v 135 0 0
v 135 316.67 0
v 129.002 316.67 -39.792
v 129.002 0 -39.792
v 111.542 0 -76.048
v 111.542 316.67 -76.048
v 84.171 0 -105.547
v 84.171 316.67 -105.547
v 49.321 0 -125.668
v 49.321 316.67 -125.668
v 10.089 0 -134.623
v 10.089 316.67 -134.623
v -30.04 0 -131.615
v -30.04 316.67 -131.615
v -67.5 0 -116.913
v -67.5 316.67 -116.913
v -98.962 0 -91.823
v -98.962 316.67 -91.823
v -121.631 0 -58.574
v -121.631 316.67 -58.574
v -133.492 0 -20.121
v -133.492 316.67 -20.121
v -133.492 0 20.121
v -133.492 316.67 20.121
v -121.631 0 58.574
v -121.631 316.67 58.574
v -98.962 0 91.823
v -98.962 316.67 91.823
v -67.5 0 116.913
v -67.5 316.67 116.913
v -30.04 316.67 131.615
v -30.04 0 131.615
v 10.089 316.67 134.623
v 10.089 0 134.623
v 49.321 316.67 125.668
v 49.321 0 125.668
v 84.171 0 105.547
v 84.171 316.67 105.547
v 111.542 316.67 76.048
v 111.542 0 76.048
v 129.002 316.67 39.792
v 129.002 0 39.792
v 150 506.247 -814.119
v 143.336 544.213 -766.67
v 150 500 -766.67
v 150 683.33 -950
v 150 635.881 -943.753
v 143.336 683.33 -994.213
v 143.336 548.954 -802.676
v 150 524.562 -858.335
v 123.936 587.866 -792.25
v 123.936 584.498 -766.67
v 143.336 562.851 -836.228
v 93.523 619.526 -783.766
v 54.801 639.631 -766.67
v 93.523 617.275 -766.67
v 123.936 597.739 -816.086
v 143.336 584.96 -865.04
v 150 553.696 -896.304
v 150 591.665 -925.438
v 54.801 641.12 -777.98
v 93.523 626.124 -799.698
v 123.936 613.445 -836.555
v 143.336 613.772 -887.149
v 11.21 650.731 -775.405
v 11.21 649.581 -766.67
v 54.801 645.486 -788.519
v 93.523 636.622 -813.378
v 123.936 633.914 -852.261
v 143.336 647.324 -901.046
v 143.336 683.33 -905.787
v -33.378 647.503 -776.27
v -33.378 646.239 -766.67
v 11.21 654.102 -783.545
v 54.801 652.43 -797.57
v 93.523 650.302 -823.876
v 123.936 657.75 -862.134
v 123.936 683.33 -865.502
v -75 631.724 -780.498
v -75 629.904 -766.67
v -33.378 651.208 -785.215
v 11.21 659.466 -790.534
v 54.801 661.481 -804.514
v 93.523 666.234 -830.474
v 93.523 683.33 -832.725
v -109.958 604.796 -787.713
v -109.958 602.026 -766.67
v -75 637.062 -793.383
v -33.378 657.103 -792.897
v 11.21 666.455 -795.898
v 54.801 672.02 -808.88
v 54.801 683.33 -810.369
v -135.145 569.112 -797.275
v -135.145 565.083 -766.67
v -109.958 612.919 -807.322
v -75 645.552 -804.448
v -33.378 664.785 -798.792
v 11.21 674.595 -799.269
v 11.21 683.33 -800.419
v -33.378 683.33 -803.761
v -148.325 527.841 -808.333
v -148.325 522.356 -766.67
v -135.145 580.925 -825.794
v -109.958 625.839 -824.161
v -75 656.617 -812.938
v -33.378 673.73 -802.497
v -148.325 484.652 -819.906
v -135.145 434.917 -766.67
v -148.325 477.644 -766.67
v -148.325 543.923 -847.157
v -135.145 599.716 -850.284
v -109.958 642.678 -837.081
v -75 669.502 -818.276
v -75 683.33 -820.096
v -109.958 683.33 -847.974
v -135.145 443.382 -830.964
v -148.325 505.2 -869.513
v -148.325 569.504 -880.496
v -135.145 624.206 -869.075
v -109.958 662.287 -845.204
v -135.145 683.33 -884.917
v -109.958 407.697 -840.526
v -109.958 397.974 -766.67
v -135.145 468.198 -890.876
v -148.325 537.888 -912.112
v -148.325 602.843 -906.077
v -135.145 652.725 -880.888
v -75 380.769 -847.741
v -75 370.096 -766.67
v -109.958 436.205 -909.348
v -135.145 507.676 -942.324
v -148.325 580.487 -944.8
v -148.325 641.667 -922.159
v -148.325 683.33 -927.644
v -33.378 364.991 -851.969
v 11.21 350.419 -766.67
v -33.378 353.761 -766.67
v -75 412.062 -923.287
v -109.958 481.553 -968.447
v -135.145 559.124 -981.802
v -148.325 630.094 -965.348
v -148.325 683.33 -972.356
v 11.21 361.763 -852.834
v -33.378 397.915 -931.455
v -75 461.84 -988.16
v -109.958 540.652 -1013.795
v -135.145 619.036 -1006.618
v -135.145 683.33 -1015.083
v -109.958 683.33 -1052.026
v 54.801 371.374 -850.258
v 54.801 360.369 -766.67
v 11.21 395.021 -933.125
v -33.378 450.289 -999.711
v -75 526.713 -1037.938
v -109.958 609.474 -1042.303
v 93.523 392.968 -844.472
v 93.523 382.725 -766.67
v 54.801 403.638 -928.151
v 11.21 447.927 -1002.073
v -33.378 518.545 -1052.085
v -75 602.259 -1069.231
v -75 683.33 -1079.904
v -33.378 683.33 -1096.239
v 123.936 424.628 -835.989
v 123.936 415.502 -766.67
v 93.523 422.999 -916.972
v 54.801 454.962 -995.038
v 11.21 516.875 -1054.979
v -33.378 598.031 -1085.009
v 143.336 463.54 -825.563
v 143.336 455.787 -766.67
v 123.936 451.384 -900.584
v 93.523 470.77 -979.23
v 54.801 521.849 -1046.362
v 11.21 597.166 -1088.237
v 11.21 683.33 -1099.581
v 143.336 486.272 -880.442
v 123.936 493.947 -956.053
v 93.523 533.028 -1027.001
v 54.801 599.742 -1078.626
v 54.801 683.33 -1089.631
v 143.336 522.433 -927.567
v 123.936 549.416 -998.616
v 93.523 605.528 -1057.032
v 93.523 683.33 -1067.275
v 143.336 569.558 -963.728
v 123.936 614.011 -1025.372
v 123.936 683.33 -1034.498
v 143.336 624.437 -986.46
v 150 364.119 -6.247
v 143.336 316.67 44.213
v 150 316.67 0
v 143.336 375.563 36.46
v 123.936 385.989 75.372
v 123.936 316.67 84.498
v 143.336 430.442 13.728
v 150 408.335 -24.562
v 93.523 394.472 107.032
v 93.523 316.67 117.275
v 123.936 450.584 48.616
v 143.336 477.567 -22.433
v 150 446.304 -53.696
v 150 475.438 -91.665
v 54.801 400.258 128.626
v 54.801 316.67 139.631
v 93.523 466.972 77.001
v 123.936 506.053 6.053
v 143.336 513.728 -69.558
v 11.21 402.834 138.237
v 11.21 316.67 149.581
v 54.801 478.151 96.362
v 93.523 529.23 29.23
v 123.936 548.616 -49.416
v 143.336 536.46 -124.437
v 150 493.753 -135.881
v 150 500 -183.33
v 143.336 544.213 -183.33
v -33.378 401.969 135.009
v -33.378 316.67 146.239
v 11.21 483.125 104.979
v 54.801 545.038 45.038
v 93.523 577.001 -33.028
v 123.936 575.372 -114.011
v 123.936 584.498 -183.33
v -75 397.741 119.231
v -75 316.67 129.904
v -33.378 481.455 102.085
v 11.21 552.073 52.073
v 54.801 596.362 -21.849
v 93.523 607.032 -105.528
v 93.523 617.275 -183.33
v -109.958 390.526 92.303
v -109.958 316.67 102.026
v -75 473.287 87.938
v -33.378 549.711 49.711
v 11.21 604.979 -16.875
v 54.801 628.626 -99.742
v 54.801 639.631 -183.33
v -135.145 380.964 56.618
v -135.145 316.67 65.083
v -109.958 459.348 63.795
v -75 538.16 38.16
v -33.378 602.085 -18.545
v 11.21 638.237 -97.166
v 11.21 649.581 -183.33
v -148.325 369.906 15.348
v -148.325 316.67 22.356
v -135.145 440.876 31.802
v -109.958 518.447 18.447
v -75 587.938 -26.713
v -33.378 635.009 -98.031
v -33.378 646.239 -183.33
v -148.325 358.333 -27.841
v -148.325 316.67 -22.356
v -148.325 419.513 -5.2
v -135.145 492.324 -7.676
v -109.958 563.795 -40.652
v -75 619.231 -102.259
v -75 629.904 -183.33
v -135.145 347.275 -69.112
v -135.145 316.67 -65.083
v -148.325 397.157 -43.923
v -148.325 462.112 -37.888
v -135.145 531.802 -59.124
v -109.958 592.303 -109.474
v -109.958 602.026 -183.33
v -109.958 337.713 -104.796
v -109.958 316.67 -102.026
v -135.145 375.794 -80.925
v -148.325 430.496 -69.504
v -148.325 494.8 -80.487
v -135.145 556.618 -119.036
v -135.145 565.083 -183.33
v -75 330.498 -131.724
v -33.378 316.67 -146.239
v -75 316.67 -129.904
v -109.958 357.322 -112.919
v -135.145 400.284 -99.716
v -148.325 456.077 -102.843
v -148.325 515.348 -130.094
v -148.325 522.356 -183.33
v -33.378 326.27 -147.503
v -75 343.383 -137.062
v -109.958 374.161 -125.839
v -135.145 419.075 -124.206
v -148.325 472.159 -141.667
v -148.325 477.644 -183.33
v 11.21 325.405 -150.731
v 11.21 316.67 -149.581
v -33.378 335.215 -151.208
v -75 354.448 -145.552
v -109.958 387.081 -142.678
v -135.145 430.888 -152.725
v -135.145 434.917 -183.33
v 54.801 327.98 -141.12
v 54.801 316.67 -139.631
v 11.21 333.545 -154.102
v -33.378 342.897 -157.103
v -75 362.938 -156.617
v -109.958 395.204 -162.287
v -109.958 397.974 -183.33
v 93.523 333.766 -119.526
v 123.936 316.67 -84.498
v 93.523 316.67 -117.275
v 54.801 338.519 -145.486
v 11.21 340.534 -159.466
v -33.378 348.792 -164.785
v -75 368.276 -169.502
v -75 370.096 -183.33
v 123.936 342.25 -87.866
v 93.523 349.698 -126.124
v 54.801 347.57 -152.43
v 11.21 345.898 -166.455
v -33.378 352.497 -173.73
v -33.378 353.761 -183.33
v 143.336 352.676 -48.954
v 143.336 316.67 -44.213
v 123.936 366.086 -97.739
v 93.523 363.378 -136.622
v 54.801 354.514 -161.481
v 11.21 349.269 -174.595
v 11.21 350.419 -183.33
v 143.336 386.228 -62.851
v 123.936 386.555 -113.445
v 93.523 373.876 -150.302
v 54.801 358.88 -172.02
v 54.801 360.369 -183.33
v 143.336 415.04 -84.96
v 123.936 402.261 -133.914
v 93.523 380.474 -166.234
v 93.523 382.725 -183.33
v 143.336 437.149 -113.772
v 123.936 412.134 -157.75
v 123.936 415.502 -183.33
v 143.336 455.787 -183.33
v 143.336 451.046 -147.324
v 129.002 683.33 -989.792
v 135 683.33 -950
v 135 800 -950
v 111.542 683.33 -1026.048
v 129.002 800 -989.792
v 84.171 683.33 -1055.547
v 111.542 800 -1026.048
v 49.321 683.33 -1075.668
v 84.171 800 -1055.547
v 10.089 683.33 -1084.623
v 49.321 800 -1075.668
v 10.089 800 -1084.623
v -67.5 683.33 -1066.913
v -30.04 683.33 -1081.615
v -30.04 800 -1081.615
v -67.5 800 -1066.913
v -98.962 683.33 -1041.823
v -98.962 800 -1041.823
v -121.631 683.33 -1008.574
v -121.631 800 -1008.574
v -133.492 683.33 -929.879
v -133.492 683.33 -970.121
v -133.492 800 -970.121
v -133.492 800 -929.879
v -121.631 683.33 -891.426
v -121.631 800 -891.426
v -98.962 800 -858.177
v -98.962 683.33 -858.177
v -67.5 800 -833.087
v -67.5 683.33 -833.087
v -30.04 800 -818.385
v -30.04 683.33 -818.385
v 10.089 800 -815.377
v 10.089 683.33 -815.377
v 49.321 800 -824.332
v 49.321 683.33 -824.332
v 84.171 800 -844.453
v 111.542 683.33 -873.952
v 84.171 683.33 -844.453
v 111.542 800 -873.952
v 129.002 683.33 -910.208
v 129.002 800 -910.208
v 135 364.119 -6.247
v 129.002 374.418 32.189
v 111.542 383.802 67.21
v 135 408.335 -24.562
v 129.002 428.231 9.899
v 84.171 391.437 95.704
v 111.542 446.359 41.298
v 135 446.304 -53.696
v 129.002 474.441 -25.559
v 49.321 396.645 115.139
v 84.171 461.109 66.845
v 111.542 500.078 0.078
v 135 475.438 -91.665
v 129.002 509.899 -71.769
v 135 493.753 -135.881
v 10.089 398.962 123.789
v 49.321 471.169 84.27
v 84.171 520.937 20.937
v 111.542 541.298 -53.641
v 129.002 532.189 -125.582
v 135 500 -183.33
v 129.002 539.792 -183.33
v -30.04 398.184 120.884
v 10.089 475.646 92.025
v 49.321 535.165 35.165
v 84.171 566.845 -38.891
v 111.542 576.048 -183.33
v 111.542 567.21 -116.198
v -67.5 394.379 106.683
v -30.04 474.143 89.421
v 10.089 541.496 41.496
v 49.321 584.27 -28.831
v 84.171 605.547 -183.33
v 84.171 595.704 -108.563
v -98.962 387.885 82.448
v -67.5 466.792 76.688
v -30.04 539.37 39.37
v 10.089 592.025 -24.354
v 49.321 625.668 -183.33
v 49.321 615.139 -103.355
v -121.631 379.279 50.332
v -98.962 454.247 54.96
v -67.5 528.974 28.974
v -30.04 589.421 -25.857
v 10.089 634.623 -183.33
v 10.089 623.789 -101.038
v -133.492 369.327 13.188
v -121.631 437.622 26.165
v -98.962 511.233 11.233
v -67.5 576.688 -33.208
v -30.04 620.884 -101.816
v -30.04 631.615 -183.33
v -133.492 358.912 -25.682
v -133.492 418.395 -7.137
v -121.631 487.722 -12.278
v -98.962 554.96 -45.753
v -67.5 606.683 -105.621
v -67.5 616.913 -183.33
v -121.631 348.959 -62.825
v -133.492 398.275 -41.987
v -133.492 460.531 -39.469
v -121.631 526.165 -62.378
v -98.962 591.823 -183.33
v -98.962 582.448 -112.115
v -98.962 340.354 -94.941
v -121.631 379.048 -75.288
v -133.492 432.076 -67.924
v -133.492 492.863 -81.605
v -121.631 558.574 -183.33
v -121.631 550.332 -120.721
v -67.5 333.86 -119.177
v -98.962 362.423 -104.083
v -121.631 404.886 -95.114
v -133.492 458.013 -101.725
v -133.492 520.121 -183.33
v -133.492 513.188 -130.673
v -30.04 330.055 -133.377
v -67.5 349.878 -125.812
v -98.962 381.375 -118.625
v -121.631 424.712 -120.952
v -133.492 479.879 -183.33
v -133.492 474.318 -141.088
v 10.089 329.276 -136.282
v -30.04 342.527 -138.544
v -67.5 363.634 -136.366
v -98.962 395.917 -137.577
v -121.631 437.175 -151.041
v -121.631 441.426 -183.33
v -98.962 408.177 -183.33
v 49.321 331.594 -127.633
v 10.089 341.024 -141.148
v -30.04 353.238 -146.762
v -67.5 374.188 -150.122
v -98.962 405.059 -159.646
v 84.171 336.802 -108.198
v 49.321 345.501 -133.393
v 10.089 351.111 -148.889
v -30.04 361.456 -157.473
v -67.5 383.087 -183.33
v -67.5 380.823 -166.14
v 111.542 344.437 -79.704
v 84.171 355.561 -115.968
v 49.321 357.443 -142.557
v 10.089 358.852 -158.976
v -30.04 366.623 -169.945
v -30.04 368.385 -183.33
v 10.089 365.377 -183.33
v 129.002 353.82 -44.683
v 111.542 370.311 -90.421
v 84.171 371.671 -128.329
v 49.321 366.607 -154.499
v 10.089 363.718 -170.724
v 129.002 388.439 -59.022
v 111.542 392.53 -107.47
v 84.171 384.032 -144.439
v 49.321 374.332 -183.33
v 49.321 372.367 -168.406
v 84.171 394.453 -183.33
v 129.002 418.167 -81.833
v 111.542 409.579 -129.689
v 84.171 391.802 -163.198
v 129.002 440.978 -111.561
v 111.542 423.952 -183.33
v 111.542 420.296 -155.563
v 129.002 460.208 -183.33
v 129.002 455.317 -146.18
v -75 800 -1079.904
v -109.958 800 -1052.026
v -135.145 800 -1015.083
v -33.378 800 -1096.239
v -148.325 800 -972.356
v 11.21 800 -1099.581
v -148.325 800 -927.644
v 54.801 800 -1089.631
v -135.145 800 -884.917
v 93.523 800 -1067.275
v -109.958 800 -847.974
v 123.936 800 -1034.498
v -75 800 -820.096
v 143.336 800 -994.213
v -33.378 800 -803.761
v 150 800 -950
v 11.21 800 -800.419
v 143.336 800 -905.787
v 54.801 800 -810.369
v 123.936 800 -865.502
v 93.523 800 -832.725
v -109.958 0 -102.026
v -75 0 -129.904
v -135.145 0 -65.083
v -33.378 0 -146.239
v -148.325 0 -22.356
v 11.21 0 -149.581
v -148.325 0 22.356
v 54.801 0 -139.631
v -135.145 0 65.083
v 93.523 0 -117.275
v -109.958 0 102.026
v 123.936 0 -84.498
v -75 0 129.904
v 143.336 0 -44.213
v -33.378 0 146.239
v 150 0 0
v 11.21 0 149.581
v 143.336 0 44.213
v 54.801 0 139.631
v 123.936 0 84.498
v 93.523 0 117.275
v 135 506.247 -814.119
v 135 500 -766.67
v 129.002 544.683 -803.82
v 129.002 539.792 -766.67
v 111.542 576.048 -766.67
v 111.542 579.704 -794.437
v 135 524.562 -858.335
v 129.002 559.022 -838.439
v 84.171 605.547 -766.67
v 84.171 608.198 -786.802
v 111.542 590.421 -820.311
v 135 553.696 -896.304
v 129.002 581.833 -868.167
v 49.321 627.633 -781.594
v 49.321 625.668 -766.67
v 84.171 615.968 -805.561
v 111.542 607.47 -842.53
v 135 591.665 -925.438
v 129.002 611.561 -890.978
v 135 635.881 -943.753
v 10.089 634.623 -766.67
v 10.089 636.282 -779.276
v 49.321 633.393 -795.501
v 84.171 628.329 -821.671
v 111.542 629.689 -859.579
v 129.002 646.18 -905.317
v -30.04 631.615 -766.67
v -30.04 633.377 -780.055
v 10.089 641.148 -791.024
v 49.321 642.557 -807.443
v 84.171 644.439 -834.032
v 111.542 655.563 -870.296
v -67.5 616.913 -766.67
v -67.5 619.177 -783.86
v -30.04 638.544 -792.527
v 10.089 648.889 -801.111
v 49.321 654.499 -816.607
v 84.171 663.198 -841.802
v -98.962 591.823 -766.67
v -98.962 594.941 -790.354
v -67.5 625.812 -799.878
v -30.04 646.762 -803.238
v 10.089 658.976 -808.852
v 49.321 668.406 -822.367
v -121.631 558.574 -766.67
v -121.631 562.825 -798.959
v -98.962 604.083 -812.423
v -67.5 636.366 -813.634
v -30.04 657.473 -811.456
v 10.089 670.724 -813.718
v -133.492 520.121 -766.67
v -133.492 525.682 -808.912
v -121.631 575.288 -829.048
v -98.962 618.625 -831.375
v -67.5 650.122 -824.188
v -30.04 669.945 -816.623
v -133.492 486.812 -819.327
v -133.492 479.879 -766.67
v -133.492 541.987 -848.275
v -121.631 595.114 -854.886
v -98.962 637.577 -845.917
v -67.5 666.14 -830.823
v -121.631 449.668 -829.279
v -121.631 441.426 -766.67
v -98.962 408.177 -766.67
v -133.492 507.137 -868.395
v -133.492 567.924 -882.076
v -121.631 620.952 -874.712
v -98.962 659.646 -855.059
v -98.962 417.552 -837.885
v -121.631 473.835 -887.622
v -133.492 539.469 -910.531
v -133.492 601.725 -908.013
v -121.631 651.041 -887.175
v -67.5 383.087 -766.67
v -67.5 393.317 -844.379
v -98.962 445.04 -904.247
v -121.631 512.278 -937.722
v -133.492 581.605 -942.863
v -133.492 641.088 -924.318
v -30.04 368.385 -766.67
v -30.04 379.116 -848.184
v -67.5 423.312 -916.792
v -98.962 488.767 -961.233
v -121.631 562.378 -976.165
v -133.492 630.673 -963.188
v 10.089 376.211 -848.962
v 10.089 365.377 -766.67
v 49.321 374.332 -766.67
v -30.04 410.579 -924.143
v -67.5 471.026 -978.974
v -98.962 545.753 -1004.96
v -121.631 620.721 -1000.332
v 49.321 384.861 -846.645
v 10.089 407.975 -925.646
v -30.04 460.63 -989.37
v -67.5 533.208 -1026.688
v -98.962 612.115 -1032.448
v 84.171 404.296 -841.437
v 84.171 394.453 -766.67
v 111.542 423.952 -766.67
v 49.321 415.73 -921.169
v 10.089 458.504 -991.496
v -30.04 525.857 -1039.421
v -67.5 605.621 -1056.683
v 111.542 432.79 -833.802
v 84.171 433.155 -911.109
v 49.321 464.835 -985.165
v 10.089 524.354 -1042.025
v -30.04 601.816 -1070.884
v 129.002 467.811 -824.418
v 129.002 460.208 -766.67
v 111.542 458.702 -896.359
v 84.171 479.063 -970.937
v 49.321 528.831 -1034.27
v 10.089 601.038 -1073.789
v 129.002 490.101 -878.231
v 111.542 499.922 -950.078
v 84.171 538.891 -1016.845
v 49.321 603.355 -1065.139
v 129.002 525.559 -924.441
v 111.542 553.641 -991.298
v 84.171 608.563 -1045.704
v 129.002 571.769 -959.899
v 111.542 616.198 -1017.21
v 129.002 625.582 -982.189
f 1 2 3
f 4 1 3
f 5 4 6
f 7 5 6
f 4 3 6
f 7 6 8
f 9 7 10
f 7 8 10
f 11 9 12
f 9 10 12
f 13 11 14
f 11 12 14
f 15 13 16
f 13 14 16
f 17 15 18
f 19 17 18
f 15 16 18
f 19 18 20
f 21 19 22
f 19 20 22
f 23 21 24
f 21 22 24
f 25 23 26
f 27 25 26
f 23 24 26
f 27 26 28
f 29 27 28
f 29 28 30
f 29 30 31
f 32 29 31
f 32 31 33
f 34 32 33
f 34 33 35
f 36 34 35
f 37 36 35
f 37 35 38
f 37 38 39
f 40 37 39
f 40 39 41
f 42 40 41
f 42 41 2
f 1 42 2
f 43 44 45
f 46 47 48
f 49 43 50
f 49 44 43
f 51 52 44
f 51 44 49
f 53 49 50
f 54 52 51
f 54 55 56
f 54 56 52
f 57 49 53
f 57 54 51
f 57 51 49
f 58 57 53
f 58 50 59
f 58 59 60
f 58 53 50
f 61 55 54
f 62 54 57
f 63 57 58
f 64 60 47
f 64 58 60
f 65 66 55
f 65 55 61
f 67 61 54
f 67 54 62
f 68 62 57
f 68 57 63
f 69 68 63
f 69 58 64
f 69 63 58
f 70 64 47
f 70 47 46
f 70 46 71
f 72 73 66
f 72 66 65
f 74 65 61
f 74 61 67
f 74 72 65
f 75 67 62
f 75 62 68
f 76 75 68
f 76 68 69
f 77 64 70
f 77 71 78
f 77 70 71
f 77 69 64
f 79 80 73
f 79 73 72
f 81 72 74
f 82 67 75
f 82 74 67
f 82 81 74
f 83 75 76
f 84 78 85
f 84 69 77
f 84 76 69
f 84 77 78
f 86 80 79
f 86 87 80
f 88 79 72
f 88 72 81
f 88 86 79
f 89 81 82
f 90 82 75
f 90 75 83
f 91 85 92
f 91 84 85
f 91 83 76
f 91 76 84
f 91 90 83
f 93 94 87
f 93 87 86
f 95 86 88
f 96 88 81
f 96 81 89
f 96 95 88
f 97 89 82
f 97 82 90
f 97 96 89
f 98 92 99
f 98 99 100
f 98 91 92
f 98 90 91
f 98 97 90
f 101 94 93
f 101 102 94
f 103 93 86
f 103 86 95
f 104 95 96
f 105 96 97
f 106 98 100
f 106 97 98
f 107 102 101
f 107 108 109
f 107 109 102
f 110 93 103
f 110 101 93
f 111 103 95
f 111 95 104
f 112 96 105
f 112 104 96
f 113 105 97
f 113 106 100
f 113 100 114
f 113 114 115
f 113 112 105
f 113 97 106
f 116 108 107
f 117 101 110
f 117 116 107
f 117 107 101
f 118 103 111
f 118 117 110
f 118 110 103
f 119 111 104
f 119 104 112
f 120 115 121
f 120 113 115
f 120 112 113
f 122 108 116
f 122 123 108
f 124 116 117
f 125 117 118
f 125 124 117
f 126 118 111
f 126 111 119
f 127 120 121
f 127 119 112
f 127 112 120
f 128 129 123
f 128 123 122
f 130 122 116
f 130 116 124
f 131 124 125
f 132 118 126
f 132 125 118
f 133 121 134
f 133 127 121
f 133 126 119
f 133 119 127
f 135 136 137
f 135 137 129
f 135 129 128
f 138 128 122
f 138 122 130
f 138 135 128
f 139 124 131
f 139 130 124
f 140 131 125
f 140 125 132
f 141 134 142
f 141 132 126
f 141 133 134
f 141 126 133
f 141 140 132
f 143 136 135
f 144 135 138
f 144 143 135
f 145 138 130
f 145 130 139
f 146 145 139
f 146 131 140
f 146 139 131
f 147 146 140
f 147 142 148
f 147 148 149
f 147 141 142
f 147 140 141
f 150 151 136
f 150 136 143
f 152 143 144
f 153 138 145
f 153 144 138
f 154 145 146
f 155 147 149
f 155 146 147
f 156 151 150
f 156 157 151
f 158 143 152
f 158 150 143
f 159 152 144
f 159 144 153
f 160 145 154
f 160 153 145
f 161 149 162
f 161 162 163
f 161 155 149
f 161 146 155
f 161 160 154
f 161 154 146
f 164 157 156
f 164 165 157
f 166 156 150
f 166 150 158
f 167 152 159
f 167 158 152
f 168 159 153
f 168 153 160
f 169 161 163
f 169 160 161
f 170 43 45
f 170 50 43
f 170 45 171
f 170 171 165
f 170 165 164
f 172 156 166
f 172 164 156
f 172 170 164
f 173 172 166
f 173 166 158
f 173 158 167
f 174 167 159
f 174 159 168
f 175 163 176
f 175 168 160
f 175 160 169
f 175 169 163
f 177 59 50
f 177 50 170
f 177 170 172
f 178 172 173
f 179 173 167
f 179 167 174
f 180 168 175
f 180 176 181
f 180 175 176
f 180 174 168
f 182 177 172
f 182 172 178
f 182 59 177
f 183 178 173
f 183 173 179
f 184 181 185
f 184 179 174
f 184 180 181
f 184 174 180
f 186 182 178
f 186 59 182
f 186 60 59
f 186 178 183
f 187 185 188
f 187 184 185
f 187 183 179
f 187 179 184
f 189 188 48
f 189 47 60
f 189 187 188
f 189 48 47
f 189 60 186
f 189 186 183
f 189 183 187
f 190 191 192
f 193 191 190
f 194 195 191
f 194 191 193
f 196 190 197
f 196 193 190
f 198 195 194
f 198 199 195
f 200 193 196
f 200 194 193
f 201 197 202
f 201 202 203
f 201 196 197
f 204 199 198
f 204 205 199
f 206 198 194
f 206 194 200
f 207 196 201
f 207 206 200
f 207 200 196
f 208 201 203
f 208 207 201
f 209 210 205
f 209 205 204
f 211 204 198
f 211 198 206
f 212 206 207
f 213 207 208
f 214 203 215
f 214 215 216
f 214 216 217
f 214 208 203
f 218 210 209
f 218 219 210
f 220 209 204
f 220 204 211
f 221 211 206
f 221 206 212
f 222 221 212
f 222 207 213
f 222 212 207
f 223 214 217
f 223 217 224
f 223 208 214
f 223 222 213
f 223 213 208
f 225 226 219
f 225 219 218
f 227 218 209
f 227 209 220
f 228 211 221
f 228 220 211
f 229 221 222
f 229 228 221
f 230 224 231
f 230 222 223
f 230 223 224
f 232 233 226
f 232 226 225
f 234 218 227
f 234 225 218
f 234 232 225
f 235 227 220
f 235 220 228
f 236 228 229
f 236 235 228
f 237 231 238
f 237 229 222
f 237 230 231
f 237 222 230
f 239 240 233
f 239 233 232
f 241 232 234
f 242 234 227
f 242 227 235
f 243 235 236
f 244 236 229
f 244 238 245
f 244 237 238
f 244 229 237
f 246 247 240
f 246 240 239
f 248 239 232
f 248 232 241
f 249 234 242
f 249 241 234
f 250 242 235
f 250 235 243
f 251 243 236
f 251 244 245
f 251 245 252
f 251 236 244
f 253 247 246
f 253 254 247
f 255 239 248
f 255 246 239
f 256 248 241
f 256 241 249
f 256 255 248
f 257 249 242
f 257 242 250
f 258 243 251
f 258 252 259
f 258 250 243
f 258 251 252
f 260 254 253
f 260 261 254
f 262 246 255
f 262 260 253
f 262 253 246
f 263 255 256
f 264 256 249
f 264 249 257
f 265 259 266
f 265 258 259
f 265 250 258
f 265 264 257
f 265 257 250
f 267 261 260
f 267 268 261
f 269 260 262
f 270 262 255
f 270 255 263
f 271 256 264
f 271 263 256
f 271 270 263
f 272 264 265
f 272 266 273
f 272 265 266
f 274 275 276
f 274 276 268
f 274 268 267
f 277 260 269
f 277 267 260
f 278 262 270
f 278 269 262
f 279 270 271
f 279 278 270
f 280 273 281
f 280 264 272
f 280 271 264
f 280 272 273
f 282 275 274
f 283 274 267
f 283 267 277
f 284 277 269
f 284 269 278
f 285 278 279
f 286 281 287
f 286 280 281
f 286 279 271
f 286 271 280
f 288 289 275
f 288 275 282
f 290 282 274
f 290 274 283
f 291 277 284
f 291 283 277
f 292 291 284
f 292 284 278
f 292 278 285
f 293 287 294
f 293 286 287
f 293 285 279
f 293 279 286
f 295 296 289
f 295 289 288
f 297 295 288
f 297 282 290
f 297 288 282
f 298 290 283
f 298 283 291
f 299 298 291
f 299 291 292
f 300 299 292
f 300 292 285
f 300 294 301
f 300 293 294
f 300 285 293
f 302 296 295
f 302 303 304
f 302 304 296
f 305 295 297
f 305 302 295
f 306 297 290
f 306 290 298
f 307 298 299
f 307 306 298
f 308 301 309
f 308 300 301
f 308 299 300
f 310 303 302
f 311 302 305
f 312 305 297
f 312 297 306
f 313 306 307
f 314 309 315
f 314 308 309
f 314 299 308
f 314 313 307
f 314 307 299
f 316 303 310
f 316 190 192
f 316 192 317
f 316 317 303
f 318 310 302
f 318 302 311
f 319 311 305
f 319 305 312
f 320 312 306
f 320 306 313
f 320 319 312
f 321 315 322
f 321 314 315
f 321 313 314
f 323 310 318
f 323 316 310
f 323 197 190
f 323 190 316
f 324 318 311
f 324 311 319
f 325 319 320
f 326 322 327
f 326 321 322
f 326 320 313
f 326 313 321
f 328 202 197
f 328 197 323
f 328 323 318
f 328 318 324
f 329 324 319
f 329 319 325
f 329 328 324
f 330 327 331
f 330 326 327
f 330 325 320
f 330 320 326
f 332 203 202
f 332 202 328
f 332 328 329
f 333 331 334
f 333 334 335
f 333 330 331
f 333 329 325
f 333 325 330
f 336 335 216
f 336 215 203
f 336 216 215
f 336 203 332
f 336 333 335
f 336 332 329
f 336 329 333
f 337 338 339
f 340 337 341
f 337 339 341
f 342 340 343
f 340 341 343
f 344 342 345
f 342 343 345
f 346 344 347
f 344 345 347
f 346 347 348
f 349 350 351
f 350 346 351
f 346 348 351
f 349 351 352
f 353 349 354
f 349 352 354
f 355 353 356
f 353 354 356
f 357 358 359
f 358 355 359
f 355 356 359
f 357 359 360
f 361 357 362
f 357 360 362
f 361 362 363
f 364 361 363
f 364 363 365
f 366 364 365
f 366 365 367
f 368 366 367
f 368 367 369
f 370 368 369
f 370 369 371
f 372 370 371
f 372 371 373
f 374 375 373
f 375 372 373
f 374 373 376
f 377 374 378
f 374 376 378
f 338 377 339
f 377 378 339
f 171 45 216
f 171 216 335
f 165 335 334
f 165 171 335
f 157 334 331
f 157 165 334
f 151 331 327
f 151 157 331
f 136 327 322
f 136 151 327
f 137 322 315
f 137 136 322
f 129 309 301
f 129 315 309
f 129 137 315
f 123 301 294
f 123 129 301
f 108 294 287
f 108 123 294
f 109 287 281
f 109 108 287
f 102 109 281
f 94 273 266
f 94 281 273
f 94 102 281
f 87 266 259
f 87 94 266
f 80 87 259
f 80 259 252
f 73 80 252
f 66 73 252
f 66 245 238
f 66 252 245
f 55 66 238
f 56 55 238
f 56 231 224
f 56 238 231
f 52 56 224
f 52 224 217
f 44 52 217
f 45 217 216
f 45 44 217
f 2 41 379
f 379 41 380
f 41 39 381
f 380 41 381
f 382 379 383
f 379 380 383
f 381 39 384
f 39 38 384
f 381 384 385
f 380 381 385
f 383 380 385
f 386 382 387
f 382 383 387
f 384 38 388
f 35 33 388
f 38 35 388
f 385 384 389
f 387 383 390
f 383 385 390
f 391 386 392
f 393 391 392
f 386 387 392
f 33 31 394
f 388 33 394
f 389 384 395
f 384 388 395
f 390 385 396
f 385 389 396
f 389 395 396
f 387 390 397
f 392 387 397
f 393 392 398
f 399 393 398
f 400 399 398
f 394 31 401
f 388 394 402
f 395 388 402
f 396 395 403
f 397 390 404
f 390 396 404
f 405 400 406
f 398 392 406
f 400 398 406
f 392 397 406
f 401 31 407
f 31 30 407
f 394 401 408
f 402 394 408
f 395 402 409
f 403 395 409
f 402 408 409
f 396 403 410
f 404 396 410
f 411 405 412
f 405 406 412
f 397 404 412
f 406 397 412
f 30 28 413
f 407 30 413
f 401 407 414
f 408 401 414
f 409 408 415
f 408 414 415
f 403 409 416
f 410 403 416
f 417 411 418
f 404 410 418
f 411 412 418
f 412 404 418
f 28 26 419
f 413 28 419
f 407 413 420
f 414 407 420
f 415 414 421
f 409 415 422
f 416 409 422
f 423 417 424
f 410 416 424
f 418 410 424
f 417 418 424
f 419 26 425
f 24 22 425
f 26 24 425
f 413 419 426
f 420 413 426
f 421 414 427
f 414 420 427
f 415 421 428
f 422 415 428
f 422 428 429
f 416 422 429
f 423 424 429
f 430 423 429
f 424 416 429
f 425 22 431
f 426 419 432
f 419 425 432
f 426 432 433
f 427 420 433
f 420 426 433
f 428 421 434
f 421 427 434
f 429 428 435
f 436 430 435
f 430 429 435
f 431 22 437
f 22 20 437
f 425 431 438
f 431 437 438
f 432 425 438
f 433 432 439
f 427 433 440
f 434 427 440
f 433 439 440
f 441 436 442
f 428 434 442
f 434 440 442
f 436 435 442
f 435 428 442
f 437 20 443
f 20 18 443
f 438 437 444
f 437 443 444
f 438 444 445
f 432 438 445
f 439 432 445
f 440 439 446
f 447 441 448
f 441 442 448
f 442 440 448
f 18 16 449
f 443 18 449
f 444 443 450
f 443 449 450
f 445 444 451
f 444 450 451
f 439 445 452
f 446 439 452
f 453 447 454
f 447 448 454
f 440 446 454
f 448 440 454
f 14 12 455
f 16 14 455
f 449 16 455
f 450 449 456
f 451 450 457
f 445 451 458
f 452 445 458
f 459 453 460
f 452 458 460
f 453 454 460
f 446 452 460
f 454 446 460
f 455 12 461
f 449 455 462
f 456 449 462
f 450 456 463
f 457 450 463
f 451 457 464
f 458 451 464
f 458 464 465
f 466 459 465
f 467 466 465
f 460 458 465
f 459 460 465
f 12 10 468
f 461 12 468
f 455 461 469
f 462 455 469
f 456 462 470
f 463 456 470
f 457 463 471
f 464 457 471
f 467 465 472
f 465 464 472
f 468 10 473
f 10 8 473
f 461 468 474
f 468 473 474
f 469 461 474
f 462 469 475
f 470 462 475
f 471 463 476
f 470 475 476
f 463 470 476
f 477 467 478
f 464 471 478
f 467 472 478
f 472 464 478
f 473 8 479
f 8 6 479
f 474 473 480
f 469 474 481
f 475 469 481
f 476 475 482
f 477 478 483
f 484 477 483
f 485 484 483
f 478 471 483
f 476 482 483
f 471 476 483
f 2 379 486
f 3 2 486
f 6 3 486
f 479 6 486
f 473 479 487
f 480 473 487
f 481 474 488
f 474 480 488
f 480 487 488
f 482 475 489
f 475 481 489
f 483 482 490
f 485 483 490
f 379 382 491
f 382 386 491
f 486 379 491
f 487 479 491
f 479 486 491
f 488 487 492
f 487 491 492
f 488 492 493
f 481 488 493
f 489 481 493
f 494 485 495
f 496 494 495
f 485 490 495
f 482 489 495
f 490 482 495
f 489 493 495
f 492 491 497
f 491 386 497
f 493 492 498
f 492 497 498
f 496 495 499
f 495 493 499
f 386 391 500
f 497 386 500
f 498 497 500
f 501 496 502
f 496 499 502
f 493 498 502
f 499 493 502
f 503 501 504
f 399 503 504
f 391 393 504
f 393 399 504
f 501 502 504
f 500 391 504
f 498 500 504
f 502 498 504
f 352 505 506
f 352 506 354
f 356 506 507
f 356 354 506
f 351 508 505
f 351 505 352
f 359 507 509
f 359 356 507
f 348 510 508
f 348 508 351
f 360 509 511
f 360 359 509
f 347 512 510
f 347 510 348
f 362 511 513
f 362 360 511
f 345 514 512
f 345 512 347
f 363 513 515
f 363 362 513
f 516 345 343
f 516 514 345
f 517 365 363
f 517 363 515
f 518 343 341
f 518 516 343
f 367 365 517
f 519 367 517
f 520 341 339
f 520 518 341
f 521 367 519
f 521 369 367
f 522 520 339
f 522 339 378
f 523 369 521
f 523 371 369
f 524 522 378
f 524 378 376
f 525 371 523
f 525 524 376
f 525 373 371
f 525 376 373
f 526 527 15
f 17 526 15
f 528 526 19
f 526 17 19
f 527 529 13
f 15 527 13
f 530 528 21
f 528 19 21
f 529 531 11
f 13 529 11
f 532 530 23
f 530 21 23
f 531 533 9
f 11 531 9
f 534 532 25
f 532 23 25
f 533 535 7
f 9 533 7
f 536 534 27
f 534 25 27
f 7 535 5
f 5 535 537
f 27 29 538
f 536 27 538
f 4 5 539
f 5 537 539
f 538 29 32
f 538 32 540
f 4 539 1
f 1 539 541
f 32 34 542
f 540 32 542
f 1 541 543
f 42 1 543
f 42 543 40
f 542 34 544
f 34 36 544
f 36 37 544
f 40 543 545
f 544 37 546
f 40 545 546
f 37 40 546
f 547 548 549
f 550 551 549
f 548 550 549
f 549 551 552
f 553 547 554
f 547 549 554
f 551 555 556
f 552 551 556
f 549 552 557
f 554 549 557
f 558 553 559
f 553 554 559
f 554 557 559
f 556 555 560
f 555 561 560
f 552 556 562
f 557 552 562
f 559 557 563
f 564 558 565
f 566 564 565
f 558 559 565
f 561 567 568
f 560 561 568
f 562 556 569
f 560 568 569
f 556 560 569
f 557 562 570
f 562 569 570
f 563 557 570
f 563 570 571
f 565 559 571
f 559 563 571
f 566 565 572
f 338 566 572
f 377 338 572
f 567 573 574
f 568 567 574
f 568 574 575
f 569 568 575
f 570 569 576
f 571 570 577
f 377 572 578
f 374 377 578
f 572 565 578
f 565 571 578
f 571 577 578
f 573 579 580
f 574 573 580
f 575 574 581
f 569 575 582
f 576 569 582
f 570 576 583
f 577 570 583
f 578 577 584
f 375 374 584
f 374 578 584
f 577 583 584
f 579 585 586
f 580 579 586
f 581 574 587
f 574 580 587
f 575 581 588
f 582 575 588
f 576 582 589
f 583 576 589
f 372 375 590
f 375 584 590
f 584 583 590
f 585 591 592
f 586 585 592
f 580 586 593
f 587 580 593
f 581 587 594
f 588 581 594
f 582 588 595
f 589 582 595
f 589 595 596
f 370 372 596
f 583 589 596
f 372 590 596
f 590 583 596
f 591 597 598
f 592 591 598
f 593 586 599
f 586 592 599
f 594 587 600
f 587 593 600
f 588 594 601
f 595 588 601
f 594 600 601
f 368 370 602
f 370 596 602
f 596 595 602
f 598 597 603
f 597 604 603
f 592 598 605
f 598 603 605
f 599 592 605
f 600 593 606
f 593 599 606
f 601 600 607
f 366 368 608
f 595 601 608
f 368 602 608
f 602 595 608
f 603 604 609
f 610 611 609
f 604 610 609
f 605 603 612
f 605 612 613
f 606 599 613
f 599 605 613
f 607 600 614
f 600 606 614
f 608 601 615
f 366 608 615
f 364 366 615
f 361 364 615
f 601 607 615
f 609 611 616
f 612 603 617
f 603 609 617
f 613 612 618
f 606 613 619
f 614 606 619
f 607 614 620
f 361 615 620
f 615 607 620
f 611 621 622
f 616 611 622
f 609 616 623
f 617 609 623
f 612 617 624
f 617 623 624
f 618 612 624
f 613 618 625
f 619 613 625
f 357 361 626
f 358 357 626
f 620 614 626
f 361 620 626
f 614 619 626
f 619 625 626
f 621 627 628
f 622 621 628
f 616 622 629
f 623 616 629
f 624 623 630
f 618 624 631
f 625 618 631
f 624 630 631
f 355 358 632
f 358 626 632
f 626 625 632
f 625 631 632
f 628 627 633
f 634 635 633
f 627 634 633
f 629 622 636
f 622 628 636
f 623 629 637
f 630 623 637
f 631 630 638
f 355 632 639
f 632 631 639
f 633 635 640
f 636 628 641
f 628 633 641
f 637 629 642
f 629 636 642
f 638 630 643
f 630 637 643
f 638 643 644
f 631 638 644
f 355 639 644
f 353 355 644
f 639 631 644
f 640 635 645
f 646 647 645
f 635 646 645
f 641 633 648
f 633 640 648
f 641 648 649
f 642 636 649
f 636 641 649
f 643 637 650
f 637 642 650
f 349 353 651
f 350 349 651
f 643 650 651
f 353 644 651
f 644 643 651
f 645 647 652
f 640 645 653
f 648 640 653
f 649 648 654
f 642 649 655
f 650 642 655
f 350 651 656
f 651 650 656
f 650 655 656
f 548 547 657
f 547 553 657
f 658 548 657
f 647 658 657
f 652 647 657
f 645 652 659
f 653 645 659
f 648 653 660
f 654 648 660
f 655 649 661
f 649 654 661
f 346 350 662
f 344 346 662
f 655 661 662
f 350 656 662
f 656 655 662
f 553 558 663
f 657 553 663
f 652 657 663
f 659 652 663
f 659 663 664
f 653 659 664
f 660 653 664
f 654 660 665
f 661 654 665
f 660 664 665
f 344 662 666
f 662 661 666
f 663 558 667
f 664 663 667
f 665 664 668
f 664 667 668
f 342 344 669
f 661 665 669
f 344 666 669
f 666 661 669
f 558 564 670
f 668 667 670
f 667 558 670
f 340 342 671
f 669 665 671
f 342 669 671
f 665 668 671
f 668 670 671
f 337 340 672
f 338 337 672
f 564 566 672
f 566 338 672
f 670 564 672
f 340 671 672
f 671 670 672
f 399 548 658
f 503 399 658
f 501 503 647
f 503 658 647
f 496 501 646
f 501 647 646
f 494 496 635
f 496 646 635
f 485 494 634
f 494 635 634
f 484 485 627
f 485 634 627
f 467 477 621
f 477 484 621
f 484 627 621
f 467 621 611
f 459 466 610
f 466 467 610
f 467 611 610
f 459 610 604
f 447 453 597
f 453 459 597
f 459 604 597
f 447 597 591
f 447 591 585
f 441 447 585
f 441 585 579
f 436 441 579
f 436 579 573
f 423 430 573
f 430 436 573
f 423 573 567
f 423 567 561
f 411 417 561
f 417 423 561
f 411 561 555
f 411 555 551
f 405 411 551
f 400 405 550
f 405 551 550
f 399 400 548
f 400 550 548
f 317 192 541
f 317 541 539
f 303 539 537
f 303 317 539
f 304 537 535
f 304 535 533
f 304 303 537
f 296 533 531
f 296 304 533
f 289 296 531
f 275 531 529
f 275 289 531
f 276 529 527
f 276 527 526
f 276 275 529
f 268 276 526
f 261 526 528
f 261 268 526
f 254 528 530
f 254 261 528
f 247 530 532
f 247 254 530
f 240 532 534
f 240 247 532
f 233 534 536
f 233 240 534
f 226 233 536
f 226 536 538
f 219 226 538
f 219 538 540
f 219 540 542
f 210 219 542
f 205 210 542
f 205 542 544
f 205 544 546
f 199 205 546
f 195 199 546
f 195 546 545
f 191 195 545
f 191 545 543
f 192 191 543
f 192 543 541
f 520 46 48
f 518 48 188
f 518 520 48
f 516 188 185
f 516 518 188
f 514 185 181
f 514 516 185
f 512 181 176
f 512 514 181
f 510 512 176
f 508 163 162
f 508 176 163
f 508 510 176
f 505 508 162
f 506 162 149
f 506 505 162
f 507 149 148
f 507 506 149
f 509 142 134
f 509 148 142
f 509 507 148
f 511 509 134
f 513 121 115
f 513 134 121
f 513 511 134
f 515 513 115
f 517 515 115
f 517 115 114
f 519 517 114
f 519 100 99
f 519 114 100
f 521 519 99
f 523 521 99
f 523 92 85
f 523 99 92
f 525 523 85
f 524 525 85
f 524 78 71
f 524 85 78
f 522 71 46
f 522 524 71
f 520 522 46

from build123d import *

# Parameters (mm, degrees)
SKETCH2_R   = 150
SKETCH2_R_2 = 135


with BuildPart() as part:
    # Sweep2: sweep along a path in Sketch1
    with BuildLine(Plane(origin=(0, 0, 0), x_dir=(0, 0, -1), z_dir=(1, 0, 0))) as sweep2_path:
        Line((0, 0), (0, 316.67))
        ThreePointArc((0, 316.67), (53.696113805, 446.303886195), (183.33, 500))
        Line((183.33, 500), (500, 500))
        Line((500, 500), (766.67, 500))
        ThreePointArc((766.67, 500), (896.303886195, 553.696113805), (950, 683.33))
        Line((950, 683.33), (950, 800))
    # Sketch2 → Sweep2 (sweep)
    with BuildSketch(Plane(origin=(0, 0, 0), x_dir=(1, 0, 0), z_dir=(0, 1, 0))):
        Circle(SKETCH2_R)
        Circle(SKETCH2_R_2, mode=Mode.SUBTRACT)
    sweep(path=sweep2_path.line)


solid = part.part
